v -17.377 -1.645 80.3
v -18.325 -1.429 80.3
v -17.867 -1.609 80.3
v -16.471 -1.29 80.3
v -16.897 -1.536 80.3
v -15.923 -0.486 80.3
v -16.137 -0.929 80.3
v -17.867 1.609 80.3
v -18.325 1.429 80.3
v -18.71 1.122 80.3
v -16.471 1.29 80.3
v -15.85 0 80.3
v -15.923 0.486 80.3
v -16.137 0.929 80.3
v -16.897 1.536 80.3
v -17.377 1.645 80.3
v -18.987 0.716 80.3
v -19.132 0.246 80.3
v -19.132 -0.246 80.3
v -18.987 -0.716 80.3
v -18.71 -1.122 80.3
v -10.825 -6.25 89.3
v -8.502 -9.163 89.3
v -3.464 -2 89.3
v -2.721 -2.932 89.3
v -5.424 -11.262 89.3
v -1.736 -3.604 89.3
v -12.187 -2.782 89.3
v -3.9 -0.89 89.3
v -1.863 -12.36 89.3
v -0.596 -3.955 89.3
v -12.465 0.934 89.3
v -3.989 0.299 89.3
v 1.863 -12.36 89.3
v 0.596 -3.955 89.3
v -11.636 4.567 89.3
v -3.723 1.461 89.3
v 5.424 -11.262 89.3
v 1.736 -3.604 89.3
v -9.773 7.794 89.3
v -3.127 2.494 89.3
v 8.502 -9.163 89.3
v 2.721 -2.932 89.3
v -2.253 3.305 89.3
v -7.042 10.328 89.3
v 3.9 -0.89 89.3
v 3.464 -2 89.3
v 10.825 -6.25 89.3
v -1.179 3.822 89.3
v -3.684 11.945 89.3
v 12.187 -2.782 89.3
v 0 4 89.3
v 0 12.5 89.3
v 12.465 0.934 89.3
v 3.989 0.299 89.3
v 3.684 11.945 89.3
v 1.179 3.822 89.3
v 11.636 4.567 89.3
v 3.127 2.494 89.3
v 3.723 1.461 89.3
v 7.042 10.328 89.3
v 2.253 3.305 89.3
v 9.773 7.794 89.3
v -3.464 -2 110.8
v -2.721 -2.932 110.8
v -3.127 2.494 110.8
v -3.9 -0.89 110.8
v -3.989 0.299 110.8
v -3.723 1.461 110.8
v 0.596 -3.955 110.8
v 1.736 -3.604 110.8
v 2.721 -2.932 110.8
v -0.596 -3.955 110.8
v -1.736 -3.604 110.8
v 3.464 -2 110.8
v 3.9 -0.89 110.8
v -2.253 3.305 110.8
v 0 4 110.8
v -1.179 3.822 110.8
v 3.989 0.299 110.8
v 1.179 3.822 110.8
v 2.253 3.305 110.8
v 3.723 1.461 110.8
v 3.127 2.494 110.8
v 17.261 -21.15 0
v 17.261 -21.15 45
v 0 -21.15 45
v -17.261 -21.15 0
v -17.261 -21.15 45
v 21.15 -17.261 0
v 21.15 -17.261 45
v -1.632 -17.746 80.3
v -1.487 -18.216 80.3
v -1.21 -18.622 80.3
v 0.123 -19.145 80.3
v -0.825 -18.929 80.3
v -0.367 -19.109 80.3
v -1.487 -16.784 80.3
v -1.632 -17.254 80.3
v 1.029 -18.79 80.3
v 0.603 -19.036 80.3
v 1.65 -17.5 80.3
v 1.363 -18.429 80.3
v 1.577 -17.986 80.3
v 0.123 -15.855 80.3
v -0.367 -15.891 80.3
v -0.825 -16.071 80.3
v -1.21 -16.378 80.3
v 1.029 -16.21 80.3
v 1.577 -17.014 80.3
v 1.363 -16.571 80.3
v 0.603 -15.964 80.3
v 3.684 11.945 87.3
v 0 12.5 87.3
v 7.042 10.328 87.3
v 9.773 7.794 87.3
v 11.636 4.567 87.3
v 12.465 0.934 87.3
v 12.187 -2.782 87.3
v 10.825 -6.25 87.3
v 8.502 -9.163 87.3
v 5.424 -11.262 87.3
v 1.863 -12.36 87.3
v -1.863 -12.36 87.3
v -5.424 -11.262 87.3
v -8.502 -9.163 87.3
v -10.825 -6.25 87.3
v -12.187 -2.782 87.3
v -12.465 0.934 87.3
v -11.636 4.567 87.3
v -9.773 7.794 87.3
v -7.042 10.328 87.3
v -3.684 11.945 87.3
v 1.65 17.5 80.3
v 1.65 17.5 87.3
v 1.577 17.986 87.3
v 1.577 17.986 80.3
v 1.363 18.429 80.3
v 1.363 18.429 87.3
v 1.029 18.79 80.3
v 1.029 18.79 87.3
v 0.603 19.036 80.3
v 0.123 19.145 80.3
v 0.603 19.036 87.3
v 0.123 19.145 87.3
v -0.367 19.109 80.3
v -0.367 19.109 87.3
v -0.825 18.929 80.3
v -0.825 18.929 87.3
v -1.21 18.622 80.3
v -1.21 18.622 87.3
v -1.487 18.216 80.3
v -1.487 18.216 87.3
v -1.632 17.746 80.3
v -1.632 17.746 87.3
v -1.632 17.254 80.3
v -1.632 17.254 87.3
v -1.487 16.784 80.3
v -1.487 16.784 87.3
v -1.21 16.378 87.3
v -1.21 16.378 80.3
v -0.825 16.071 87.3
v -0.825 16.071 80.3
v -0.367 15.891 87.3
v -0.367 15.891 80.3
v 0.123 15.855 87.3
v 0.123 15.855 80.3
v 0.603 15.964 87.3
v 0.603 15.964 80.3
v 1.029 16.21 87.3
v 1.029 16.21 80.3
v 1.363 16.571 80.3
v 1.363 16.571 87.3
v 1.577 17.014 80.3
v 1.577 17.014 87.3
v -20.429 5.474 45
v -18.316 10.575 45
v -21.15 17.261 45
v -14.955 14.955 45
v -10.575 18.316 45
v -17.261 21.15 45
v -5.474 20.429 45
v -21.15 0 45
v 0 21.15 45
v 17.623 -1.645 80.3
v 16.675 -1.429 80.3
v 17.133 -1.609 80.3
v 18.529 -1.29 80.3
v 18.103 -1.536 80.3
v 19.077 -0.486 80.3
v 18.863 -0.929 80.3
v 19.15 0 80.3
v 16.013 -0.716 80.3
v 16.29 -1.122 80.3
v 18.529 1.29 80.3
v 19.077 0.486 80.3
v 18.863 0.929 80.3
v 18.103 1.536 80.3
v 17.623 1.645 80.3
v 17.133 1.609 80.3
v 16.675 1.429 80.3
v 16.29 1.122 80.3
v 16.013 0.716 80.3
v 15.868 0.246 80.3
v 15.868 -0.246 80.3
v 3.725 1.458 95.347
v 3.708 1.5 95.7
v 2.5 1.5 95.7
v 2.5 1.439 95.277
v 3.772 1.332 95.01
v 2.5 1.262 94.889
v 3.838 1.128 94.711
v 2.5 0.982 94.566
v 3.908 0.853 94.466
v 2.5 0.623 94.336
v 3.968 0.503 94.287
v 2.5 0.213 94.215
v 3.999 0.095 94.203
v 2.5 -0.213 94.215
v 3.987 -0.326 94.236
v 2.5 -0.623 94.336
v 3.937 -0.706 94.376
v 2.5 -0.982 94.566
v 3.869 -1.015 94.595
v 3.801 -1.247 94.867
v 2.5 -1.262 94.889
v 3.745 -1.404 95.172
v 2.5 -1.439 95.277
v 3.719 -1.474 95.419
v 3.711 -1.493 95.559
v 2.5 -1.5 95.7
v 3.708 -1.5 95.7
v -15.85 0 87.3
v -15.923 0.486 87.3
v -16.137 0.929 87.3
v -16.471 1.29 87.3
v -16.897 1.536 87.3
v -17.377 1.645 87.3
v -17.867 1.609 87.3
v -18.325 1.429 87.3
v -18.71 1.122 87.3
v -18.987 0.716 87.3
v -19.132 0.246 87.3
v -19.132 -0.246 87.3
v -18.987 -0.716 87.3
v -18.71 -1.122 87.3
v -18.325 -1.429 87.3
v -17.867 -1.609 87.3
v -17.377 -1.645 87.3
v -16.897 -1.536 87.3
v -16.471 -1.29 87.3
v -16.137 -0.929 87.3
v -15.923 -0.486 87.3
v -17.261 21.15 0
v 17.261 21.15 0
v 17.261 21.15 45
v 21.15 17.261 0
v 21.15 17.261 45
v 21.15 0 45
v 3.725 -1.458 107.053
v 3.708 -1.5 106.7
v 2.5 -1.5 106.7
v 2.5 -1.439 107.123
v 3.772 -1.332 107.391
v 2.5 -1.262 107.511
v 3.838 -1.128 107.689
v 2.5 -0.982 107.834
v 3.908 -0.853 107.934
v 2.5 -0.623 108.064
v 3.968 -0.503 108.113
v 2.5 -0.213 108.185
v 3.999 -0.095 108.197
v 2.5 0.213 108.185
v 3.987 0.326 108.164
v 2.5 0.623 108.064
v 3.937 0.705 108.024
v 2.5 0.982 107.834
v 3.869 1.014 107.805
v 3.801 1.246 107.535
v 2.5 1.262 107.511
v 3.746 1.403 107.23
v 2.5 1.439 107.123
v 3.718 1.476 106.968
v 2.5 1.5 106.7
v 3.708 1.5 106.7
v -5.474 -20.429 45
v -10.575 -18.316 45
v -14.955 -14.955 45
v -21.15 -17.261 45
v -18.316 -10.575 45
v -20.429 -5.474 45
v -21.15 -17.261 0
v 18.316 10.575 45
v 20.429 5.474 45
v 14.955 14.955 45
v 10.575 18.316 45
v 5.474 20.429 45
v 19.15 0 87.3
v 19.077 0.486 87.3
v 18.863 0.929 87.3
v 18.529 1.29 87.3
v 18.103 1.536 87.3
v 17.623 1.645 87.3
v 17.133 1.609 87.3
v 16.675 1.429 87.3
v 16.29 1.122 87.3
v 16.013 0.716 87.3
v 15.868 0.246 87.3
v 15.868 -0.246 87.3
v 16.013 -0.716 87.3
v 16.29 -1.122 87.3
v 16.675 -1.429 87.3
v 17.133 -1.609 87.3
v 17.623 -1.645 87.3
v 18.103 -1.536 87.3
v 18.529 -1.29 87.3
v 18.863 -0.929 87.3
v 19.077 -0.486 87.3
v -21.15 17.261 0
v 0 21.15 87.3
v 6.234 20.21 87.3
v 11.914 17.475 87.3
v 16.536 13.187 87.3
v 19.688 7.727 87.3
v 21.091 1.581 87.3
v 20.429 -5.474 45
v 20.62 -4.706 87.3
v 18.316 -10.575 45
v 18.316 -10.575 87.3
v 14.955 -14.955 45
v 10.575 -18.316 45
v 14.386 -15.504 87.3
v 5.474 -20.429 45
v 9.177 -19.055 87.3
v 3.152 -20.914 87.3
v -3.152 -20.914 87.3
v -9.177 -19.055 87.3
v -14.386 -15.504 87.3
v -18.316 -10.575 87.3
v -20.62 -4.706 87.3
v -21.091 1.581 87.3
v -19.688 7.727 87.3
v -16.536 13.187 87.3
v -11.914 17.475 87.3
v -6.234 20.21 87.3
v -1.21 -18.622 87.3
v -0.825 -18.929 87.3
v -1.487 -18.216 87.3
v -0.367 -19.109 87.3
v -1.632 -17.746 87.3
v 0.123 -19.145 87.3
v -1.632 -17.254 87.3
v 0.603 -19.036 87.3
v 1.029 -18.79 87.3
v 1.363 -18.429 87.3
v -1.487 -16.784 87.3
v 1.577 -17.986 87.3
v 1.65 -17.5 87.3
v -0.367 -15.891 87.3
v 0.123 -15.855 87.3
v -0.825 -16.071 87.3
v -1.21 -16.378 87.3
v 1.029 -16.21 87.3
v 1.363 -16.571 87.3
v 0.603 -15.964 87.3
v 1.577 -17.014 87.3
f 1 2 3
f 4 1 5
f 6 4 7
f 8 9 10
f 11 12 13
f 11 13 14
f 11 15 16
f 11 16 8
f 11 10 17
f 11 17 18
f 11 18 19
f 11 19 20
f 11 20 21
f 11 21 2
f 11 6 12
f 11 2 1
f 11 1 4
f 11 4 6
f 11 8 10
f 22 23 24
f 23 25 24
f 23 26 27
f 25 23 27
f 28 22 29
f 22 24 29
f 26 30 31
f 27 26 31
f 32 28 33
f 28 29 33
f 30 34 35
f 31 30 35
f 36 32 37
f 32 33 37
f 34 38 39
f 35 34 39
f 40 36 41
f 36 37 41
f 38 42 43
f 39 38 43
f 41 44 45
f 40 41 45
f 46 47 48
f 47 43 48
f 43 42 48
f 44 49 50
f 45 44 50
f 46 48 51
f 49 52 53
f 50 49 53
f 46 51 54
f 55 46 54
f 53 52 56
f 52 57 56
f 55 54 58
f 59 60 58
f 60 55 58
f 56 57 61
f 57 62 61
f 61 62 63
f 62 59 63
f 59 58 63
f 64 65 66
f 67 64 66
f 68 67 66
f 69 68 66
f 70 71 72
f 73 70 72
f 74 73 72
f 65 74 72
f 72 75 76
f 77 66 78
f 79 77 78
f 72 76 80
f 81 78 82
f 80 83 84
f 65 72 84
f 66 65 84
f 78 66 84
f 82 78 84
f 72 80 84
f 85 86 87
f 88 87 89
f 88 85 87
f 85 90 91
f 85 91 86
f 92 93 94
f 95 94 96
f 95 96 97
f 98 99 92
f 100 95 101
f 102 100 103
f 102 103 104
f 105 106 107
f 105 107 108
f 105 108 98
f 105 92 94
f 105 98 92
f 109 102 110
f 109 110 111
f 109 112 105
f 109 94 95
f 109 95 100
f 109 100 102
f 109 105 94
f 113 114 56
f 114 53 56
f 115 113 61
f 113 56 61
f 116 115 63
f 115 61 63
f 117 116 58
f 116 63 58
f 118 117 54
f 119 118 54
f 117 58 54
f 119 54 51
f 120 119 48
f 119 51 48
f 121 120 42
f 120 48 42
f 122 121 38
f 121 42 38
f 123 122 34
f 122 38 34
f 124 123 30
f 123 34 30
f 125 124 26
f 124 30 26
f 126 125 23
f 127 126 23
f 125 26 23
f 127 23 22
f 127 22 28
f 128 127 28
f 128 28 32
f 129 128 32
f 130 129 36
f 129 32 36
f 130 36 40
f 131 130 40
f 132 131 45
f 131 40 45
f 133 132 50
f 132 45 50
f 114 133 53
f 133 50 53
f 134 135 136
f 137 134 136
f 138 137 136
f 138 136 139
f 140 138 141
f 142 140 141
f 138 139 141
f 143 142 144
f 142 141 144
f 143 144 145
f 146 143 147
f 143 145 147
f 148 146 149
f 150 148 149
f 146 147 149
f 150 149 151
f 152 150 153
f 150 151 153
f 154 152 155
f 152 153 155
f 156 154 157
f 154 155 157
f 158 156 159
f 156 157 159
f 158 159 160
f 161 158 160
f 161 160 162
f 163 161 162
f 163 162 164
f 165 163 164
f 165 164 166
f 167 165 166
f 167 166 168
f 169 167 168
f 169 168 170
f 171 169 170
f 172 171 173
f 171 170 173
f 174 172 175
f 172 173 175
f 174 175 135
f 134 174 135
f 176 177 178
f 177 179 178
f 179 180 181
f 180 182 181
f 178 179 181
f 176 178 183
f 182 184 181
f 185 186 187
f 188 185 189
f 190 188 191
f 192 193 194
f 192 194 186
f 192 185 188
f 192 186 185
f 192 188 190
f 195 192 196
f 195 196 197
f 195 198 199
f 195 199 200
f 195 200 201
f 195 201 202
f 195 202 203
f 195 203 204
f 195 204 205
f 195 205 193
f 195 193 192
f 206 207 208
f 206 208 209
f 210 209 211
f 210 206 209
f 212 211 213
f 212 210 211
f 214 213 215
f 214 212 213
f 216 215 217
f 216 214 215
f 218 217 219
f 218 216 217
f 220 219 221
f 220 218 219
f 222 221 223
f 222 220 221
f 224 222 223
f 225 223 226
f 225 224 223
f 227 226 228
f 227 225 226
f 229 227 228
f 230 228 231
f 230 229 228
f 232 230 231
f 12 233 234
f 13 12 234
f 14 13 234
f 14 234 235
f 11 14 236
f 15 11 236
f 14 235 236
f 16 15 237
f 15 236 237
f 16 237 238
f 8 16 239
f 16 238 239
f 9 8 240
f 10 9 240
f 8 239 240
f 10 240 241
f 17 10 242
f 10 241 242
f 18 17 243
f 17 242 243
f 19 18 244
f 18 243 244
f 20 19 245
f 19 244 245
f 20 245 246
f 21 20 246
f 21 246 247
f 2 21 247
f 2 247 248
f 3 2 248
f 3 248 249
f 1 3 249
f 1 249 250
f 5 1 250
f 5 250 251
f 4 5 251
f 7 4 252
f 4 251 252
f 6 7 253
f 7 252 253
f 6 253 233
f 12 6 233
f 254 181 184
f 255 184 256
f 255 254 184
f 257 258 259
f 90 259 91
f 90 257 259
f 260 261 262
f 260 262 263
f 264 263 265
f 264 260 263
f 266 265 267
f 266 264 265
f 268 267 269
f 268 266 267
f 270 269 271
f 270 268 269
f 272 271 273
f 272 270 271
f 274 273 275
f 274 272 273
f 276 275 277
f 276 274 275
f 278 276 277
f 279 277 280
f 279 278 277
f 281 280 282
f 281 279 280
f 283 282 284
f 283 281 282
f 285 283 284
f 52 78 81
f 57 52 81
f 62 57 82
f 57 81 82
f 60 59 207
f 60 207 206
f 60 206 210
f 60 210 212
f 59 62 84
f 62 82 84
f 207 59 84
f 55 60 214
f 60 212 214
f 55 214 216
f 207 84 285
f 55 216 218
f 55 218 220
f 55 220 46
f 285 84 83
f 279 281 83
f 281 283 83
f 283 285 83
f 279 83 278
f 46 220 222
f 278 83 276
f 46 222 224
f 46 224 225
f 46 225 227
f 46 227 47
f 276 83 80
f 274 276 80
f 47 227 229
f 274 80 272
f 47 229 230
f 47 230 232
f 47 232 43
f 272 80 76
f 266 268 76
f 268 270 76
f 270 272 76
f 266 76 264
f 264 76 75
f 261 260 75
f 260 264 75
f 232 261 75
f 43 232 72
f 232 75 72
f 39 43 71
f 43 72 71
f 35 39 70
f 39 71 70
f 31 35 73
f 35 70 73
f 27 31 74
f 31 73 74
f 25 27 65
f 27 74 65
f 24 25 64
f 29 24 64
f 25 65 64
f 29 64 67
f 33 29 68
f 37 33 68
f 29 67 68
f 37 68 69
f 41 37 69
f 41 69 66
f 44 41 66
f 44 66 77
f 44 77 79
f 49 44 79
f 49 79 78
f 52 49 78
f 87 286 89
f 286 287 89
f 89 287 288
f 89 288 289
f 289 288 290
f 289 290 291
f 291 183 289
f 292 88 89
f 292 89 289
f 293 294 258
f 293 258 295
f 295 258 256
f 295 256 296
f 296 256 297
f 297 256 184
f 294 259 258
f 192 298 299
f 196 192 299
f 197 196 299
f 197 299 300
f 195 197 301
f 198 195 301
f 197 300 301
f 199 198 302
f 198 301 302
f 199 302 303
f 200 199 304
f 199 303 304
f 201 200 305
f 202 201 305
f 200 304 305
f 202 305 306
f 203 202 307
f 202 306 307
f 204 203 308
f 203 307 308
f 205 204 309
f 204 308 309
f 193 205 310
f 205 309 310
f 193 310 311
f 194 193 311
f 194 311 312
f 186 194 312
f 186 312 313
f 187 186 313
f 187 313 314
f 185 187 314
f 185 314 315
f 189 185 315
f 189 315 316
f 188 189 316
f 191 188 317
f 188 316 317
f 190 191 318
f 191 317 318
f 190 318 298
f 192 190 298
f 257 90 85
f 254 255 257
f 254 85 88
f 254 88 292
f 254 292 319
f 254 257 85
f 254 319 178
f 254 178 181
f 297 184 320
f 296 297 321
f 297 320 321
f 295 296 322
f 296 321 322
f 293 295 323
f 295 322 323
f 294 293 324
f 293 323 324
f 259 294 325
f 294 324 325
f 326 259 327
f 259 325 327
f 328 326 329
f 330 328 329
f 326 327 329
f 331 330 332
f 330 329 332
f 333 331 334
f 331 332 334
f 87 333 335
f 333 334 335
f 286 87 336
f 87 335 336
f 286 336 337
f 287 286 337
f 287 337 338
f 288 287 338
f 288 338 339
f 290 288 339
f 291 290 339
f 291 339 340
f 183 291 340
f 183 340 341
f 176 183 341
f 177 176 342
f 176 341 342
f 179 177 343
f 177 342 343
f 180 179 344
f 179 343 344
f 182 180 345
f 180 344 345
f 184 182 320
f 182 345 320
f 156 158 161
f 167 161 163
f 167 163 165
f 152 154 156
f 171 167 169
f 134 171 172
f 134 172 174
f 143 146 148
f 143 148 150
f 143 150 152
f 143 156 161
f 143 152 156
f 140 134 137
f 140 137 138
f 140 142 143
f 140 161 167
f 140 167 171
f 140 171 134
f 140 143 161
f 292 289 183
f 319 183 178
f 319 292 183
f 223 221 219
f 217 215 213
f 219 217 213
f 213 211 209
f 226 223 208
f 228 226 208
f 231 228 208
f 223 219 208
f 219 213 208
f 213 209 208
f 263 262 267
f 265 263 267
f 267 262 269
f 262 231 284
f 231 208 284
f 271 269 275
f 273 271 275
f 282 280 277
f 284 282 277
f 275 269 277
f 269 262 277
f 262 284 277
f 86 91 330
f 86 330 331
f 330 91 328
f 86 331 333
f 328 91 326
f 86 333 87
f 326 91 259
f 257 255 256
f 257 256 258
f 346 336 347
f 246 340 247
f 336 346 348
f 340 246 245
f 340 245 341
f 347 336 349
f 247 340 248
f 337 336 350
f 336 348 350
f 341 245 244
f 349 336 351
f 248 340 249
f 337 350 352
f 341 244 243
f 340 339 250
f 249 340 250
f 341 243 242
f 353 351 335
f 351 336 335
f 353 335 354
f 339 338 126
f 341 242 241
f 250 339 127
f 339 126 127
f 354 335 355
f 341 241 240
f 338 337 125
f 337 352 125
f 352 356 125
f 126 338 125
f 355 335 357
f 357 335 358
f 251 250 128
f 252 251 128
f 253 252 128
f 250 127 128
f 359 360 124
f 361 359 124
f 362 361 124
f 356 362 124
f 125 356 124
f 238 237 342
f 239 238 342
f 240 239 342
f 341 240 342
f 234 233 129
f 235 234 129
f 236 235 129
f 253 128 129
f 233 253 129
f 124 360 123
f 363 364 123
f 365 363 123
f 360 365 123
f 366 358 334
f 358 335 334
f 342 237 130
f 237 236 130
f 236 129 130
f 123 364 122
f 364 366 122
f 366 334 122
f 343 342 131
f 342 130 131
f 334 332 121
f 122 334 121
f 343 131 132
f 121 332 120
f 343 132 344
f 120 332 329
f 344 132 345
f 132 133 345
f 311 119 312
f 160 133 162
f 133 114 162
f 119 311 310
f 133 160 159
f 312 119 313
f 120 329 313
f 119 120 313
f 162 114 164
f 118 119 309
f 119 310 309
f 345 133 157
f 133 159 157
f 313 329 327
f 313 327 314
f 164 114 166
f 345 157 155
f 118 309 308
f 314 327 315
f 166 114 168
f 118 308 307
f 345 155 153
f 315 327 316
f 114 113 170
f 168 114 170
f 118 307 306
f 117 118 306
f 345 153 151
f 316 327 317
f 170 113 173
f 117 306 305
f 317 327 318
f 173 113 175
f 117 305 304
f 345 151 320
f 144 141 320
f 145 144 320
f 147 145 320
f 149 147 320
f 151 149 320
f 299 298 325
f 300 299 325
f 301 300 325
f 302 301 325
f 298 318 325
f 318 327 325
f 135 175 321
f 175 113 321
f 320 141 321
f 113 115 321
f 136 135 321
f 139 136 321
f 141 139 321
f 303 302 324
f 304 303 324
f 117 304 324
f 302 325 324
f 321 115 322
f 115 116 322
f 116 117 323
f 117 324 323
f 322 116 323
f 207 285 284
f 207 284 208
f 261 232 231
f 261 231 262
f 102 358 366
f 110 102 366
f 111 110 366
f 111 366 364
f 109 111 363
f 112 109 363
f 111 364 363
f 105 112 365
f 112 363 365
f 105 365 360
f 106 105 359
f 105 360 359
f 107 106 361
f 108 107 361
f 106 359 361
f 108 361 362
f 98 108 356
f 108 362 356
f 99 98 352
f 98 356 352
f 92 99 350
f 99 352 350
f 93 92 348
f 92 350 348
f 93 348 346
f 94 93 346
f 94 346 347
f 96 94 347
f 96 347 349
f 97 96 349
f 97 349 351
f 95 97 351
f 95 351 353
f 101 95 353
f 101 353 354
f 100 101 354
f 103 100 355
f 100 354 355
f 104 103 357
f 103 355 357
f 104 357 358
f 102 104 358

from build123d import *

# Parameters (mm, degrees)
BOSS_EXTRUDE1_DEPTH = 45
SKETCH4_R           = 1.65
CUT_EXTRUDE1_DEPTH  = 7
CUT_EXTRUDE2_DEPTH  = 1.5


with BuildPart() as part:
    # Sketch1 → Boss-Extrude1 (new body)
    with BuildSketch(Plane.XY):
        Polygon((-21.15, 17.260912703), (-17.260912703, 21.15), (17.260912703, 21.15), (21.15, 17.260912703), (21.15, -17.260912703), (17.260912703, -21.15), (-17.260912703, -21.15), (-21.15, -17.260912703), align=None)
    extrude(amount=BOSS_EXTRUDE1_DEPTH)

    # Sketch3 → Revolve1 (revolve)
    with BuildSketch(Plane(origin=(0, 0, 0), x_dir=(0, 0, -1), z_dir=(1, 0, 0))):
        Polygon((-45, 21.15), (-87.3, 21.15), (-87.3, 12.5), (-89.3, 12.5), (-89.3, 4), (-110.8, 4), (-110.8, 0), (-45, 0), align=None)
    revolve(axis=Axis((0, 0, 110.8), (0, 0, -1)))

    # Sketch4 → Cut-Extrude1 (cut)
    with BuildSketch(Plane.XY.offset(87.3)):
        with Locations((0, 17.5)):
            Circle(SKETCH4_R)
        with Locations((17.5, 0)):
            Circle(SKETCH4_R)
        with Locations((0, -17.5)):
            Circle(SKETCH4_R)
        with Locations((-17.5, 0)):
            Circle(SKETCH4_R)
    extrude(amount=-CUT_EXTRUDE1_DEPTH, mode=Mode.SUBTRACT)

    # Sketch5 → Cut-Extrude2 (cut)
    with BuildSketch(Plane(origin=(4, 0, 0), x_dir=(0, 0, -1), z_dir=(1, 0, 0))):
        with BuildLine():
            Line((-106.7, 1.5), (-95.7, 1.5))
            ThreePointArc((-95.7, 1.5), (-94.2, 0), (-95.7, -1.5))
            Line((-95.7, -1.5), (-106.7, -1.5))
            ThreePointArc((-106.7, -1.5), (-108.2, 0), (-106.7, 1.5))
        make_face()
    extrude(amount=-CUT_EXTRUDE2_DEPTH, mode=Mode.SUBTRACT)


solid = part.part
